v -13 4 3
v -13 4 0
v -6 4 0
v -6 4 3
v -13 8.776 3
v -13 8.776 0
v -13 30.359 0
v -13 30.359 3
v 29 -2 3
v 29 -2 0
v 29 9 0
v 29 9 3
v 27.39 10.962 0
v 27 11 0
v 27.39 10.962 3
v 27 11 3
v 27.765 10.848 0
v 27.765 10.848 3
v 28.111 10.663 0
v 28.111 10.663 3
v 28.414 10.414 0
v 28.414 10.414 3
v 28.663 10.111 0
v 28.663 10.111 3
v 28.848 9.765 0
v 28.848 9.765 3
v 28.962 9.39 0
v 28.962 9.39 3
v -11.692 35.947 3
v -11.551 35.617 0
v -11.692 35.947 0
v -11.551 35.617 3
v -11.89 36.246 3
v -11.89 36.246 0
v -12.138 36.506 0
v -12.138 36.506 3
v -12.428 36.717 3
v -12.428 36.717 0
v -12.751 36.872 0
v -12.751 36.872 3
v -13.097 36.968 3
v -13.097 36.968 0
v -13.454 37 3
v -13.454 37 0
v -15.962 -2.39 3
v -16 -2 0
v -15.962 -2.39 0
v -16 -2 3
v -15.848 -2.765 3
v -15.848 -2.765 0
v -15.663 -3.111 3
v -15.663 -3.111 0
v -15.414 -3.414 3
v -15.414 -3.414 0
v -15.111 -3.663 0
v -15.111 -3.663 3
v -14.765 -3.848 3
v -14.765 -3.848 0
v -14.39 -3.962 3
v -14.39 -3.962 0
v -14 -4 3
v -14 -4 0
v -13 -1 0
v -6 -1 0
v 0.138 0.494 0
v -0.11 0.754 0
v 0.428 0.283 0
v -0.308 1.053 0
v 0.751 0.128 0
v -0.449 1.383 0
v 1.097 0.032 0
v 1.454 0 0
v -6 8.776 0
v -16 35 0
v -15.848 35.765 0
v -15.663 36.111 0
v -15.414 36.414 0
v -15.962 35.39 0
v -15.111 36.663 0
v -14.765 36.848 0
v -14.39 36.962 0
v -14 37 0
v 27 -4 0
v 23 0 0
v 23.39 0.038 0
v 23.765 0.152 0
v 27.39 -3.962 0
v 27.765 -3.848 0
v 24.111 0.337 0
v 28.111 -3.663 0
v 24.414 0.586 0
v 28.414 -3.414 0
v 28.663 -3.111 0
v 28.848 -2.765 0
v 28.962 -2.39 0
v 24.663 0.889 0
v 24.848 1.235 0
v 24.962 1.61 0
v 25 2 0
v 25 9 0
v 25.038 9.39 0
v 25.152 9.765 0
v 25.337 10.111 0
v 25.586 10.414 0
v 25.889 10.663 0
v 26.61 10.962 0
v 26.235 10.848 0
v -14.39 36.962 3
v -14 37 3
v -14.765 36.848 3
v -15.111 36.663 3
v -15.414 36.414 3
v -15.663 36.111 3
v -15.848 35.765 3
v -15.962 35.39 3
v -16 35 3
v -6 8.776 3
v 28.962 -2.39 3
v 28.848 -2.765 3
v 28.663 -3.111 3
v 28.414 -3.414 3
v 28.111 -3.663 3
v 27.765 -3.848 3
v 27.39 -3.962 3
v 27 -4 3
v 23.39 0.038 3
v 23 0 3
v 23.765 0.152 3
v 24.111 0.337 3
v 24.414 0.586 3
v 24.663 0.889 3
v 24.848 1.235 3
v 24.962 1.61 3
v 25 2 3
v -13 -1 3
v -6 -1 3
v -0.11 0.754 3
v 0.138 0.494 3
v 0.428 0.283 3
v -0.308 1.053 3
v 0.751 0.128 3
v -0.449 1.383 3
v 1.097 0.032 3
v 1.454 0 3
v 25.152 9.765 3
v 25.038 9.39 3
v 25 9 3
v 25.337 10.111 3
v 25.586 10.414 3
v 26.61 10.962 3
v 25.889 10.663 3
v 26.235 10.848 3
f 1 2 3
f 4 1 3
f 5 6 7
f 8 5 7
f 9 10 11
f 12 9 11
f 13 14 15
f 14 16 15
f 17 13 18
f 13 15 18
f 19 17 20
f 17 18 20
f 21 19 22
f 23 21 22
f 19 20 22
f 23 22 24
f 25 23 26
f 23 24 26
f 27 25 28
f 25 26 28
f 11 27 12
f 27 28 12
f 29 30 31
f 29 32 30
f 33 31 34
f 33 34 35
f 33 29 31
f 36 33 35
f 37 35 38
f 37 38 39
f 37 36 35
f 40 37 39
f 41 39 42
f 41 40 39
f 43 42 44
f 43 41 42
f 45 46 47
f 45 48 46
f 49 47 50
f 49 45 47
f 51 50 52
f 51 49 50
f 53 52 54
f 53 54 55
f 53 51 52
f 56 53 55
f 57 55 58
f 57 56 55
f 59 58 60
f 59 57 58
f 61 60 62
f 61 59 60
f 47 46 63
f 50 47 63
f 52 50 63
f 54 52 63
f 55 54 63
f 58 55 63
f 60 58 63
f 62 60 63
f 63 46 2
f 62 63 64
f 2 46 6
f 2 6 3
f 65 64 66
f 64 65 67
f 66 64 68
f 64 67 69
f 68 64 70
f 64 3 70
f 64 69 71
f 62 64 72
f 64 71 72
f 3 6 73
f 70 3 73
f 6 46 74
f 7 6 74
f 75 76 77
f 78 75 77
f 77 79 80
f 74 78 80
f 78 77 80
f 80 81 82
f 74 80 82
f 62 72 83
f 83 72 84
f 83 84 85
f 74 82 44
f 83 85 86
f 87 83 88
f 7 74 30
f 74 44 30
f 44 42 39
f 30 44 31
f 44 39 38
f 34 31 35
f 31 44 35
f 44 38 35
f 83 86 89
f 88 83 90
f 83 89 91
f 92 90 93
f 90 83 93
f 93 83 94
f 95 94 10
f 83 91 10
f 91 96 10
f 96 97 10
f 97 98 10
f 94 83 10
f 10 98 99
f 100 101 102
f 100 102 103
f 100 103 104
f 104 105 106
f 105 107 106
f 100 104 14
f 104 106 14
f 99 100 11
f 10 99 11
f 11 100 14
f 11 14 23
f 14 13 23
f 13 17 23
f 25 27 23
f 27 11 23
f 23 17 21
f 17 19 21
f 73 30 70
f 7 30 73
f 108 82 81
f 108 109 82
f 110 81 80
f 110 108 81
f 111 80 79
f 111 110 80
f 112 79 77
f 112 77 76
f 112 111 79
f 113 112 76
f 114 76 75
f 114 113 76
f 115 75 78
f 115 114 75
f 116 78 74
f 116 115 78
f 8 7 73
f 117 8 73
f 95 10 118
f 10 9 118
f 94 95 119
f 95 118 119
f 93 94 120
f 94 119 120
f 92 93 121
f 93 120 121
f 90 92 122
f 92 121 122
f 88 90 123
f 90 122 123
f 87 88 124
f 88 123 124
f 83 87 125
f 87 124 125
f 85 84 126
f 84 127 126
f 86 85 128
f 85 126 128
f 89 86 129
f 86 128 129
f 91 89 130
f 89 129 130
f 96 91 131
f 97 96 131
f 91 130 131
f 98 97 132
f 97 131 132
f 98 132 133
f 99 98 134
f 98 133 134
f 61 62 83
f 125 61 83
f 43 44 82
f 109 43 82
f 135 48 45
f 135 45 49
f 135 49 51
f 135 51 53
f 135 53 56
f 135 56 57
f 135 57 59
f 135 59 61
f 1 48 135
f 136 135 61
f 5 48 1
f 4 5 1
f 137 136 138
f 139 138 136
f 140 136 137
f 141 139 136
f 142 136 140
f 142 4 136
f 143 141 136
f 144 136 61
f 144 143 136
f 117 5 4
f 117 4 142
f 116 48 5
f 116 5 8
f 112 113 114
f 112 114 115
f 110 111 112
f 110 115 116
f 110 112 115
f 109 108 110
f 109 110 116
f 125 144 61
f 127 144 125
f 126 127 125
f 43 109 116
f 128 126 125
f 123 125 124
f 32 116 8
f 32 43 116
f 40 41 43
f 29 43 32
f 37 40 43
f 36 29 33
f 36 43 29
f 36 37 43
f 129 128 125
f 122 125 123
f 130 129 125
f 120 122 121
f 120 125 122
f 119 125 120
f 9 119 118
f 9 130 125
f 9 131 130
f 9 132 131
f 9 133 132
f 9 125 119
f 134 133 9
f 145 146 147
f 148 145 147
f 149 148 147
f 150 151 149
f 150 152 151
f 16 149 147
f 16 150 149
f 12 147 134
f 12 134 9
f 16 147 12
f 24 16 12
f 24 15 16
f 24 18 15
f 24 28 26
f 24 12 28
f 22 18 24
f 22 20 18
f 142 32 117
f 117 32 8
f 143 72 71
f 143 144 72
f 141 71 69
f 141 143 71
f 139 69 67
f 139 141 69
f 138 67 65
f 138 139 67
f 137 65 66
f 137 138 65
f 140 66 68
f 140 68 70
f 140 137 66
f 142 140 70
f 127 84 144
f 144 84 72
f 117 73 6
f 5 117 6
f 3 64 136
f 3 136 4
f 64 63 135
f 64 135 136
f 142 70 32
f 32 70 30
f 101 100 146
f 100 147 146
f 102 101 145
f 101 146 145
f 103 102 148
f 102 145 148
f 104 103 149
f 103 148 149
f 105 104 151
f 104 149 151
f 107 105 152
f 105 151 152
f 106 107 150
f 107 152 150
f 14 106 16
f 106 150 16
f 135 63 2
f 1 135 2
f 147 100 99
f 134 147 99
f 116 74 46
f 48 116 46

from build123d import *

# Parameters (mm, degrees)
F0_W     = 7
F0_H     = 5
F1_DEPTH = 3
F2_R     = 1.99999


# Not quite as in the source:
# - a fillet or chamfer is up to 0.001 mm smaller than in the source, because OpenCascade refuses the exact size
# - a feature names something its author has since deleted; it is built from what else it names


with BuildPart() as f1:
    # F0 (on Top) → F1 (new body)
    with BuildSketch(Plane.XY):
        Polygon((25, 0), (0, 0), (-12, 37), (-16, 37), (-16, -4), (29, -4), (29, 11), (25, 11), align=None)
        with Locations((-9.5, 1.5)):
            Rectangle(F0_W, F0_H, mode=Mode.SUBTRACT)
        Polygon((-13, 8.7756748306), (-13, 30.3590081639), (-6, 8.7756748306), align=None, mode=Mode.SUBTRACT)
    extrude(amount=F1_DEPTH)

    # F2 (radius 2 in the source; OpenCascade refuses exactly that, so slightly less here)
    f2_edges = [f1.edges().sort_by_distance(p)[0] for p in [
        (-16, -4, 1.5),
        (25, 0, 1.5),
        (-12, 37, 1.5),
        (29, 11, 1.5),
        (0, 0, 1.5),
        (-16, 37, 1.5),
        (29, -4, 1.5),
        (25, 11, 1.5),
    ]]
    fillet(f2_edges, radius=F2_R)


solid = f1.part
